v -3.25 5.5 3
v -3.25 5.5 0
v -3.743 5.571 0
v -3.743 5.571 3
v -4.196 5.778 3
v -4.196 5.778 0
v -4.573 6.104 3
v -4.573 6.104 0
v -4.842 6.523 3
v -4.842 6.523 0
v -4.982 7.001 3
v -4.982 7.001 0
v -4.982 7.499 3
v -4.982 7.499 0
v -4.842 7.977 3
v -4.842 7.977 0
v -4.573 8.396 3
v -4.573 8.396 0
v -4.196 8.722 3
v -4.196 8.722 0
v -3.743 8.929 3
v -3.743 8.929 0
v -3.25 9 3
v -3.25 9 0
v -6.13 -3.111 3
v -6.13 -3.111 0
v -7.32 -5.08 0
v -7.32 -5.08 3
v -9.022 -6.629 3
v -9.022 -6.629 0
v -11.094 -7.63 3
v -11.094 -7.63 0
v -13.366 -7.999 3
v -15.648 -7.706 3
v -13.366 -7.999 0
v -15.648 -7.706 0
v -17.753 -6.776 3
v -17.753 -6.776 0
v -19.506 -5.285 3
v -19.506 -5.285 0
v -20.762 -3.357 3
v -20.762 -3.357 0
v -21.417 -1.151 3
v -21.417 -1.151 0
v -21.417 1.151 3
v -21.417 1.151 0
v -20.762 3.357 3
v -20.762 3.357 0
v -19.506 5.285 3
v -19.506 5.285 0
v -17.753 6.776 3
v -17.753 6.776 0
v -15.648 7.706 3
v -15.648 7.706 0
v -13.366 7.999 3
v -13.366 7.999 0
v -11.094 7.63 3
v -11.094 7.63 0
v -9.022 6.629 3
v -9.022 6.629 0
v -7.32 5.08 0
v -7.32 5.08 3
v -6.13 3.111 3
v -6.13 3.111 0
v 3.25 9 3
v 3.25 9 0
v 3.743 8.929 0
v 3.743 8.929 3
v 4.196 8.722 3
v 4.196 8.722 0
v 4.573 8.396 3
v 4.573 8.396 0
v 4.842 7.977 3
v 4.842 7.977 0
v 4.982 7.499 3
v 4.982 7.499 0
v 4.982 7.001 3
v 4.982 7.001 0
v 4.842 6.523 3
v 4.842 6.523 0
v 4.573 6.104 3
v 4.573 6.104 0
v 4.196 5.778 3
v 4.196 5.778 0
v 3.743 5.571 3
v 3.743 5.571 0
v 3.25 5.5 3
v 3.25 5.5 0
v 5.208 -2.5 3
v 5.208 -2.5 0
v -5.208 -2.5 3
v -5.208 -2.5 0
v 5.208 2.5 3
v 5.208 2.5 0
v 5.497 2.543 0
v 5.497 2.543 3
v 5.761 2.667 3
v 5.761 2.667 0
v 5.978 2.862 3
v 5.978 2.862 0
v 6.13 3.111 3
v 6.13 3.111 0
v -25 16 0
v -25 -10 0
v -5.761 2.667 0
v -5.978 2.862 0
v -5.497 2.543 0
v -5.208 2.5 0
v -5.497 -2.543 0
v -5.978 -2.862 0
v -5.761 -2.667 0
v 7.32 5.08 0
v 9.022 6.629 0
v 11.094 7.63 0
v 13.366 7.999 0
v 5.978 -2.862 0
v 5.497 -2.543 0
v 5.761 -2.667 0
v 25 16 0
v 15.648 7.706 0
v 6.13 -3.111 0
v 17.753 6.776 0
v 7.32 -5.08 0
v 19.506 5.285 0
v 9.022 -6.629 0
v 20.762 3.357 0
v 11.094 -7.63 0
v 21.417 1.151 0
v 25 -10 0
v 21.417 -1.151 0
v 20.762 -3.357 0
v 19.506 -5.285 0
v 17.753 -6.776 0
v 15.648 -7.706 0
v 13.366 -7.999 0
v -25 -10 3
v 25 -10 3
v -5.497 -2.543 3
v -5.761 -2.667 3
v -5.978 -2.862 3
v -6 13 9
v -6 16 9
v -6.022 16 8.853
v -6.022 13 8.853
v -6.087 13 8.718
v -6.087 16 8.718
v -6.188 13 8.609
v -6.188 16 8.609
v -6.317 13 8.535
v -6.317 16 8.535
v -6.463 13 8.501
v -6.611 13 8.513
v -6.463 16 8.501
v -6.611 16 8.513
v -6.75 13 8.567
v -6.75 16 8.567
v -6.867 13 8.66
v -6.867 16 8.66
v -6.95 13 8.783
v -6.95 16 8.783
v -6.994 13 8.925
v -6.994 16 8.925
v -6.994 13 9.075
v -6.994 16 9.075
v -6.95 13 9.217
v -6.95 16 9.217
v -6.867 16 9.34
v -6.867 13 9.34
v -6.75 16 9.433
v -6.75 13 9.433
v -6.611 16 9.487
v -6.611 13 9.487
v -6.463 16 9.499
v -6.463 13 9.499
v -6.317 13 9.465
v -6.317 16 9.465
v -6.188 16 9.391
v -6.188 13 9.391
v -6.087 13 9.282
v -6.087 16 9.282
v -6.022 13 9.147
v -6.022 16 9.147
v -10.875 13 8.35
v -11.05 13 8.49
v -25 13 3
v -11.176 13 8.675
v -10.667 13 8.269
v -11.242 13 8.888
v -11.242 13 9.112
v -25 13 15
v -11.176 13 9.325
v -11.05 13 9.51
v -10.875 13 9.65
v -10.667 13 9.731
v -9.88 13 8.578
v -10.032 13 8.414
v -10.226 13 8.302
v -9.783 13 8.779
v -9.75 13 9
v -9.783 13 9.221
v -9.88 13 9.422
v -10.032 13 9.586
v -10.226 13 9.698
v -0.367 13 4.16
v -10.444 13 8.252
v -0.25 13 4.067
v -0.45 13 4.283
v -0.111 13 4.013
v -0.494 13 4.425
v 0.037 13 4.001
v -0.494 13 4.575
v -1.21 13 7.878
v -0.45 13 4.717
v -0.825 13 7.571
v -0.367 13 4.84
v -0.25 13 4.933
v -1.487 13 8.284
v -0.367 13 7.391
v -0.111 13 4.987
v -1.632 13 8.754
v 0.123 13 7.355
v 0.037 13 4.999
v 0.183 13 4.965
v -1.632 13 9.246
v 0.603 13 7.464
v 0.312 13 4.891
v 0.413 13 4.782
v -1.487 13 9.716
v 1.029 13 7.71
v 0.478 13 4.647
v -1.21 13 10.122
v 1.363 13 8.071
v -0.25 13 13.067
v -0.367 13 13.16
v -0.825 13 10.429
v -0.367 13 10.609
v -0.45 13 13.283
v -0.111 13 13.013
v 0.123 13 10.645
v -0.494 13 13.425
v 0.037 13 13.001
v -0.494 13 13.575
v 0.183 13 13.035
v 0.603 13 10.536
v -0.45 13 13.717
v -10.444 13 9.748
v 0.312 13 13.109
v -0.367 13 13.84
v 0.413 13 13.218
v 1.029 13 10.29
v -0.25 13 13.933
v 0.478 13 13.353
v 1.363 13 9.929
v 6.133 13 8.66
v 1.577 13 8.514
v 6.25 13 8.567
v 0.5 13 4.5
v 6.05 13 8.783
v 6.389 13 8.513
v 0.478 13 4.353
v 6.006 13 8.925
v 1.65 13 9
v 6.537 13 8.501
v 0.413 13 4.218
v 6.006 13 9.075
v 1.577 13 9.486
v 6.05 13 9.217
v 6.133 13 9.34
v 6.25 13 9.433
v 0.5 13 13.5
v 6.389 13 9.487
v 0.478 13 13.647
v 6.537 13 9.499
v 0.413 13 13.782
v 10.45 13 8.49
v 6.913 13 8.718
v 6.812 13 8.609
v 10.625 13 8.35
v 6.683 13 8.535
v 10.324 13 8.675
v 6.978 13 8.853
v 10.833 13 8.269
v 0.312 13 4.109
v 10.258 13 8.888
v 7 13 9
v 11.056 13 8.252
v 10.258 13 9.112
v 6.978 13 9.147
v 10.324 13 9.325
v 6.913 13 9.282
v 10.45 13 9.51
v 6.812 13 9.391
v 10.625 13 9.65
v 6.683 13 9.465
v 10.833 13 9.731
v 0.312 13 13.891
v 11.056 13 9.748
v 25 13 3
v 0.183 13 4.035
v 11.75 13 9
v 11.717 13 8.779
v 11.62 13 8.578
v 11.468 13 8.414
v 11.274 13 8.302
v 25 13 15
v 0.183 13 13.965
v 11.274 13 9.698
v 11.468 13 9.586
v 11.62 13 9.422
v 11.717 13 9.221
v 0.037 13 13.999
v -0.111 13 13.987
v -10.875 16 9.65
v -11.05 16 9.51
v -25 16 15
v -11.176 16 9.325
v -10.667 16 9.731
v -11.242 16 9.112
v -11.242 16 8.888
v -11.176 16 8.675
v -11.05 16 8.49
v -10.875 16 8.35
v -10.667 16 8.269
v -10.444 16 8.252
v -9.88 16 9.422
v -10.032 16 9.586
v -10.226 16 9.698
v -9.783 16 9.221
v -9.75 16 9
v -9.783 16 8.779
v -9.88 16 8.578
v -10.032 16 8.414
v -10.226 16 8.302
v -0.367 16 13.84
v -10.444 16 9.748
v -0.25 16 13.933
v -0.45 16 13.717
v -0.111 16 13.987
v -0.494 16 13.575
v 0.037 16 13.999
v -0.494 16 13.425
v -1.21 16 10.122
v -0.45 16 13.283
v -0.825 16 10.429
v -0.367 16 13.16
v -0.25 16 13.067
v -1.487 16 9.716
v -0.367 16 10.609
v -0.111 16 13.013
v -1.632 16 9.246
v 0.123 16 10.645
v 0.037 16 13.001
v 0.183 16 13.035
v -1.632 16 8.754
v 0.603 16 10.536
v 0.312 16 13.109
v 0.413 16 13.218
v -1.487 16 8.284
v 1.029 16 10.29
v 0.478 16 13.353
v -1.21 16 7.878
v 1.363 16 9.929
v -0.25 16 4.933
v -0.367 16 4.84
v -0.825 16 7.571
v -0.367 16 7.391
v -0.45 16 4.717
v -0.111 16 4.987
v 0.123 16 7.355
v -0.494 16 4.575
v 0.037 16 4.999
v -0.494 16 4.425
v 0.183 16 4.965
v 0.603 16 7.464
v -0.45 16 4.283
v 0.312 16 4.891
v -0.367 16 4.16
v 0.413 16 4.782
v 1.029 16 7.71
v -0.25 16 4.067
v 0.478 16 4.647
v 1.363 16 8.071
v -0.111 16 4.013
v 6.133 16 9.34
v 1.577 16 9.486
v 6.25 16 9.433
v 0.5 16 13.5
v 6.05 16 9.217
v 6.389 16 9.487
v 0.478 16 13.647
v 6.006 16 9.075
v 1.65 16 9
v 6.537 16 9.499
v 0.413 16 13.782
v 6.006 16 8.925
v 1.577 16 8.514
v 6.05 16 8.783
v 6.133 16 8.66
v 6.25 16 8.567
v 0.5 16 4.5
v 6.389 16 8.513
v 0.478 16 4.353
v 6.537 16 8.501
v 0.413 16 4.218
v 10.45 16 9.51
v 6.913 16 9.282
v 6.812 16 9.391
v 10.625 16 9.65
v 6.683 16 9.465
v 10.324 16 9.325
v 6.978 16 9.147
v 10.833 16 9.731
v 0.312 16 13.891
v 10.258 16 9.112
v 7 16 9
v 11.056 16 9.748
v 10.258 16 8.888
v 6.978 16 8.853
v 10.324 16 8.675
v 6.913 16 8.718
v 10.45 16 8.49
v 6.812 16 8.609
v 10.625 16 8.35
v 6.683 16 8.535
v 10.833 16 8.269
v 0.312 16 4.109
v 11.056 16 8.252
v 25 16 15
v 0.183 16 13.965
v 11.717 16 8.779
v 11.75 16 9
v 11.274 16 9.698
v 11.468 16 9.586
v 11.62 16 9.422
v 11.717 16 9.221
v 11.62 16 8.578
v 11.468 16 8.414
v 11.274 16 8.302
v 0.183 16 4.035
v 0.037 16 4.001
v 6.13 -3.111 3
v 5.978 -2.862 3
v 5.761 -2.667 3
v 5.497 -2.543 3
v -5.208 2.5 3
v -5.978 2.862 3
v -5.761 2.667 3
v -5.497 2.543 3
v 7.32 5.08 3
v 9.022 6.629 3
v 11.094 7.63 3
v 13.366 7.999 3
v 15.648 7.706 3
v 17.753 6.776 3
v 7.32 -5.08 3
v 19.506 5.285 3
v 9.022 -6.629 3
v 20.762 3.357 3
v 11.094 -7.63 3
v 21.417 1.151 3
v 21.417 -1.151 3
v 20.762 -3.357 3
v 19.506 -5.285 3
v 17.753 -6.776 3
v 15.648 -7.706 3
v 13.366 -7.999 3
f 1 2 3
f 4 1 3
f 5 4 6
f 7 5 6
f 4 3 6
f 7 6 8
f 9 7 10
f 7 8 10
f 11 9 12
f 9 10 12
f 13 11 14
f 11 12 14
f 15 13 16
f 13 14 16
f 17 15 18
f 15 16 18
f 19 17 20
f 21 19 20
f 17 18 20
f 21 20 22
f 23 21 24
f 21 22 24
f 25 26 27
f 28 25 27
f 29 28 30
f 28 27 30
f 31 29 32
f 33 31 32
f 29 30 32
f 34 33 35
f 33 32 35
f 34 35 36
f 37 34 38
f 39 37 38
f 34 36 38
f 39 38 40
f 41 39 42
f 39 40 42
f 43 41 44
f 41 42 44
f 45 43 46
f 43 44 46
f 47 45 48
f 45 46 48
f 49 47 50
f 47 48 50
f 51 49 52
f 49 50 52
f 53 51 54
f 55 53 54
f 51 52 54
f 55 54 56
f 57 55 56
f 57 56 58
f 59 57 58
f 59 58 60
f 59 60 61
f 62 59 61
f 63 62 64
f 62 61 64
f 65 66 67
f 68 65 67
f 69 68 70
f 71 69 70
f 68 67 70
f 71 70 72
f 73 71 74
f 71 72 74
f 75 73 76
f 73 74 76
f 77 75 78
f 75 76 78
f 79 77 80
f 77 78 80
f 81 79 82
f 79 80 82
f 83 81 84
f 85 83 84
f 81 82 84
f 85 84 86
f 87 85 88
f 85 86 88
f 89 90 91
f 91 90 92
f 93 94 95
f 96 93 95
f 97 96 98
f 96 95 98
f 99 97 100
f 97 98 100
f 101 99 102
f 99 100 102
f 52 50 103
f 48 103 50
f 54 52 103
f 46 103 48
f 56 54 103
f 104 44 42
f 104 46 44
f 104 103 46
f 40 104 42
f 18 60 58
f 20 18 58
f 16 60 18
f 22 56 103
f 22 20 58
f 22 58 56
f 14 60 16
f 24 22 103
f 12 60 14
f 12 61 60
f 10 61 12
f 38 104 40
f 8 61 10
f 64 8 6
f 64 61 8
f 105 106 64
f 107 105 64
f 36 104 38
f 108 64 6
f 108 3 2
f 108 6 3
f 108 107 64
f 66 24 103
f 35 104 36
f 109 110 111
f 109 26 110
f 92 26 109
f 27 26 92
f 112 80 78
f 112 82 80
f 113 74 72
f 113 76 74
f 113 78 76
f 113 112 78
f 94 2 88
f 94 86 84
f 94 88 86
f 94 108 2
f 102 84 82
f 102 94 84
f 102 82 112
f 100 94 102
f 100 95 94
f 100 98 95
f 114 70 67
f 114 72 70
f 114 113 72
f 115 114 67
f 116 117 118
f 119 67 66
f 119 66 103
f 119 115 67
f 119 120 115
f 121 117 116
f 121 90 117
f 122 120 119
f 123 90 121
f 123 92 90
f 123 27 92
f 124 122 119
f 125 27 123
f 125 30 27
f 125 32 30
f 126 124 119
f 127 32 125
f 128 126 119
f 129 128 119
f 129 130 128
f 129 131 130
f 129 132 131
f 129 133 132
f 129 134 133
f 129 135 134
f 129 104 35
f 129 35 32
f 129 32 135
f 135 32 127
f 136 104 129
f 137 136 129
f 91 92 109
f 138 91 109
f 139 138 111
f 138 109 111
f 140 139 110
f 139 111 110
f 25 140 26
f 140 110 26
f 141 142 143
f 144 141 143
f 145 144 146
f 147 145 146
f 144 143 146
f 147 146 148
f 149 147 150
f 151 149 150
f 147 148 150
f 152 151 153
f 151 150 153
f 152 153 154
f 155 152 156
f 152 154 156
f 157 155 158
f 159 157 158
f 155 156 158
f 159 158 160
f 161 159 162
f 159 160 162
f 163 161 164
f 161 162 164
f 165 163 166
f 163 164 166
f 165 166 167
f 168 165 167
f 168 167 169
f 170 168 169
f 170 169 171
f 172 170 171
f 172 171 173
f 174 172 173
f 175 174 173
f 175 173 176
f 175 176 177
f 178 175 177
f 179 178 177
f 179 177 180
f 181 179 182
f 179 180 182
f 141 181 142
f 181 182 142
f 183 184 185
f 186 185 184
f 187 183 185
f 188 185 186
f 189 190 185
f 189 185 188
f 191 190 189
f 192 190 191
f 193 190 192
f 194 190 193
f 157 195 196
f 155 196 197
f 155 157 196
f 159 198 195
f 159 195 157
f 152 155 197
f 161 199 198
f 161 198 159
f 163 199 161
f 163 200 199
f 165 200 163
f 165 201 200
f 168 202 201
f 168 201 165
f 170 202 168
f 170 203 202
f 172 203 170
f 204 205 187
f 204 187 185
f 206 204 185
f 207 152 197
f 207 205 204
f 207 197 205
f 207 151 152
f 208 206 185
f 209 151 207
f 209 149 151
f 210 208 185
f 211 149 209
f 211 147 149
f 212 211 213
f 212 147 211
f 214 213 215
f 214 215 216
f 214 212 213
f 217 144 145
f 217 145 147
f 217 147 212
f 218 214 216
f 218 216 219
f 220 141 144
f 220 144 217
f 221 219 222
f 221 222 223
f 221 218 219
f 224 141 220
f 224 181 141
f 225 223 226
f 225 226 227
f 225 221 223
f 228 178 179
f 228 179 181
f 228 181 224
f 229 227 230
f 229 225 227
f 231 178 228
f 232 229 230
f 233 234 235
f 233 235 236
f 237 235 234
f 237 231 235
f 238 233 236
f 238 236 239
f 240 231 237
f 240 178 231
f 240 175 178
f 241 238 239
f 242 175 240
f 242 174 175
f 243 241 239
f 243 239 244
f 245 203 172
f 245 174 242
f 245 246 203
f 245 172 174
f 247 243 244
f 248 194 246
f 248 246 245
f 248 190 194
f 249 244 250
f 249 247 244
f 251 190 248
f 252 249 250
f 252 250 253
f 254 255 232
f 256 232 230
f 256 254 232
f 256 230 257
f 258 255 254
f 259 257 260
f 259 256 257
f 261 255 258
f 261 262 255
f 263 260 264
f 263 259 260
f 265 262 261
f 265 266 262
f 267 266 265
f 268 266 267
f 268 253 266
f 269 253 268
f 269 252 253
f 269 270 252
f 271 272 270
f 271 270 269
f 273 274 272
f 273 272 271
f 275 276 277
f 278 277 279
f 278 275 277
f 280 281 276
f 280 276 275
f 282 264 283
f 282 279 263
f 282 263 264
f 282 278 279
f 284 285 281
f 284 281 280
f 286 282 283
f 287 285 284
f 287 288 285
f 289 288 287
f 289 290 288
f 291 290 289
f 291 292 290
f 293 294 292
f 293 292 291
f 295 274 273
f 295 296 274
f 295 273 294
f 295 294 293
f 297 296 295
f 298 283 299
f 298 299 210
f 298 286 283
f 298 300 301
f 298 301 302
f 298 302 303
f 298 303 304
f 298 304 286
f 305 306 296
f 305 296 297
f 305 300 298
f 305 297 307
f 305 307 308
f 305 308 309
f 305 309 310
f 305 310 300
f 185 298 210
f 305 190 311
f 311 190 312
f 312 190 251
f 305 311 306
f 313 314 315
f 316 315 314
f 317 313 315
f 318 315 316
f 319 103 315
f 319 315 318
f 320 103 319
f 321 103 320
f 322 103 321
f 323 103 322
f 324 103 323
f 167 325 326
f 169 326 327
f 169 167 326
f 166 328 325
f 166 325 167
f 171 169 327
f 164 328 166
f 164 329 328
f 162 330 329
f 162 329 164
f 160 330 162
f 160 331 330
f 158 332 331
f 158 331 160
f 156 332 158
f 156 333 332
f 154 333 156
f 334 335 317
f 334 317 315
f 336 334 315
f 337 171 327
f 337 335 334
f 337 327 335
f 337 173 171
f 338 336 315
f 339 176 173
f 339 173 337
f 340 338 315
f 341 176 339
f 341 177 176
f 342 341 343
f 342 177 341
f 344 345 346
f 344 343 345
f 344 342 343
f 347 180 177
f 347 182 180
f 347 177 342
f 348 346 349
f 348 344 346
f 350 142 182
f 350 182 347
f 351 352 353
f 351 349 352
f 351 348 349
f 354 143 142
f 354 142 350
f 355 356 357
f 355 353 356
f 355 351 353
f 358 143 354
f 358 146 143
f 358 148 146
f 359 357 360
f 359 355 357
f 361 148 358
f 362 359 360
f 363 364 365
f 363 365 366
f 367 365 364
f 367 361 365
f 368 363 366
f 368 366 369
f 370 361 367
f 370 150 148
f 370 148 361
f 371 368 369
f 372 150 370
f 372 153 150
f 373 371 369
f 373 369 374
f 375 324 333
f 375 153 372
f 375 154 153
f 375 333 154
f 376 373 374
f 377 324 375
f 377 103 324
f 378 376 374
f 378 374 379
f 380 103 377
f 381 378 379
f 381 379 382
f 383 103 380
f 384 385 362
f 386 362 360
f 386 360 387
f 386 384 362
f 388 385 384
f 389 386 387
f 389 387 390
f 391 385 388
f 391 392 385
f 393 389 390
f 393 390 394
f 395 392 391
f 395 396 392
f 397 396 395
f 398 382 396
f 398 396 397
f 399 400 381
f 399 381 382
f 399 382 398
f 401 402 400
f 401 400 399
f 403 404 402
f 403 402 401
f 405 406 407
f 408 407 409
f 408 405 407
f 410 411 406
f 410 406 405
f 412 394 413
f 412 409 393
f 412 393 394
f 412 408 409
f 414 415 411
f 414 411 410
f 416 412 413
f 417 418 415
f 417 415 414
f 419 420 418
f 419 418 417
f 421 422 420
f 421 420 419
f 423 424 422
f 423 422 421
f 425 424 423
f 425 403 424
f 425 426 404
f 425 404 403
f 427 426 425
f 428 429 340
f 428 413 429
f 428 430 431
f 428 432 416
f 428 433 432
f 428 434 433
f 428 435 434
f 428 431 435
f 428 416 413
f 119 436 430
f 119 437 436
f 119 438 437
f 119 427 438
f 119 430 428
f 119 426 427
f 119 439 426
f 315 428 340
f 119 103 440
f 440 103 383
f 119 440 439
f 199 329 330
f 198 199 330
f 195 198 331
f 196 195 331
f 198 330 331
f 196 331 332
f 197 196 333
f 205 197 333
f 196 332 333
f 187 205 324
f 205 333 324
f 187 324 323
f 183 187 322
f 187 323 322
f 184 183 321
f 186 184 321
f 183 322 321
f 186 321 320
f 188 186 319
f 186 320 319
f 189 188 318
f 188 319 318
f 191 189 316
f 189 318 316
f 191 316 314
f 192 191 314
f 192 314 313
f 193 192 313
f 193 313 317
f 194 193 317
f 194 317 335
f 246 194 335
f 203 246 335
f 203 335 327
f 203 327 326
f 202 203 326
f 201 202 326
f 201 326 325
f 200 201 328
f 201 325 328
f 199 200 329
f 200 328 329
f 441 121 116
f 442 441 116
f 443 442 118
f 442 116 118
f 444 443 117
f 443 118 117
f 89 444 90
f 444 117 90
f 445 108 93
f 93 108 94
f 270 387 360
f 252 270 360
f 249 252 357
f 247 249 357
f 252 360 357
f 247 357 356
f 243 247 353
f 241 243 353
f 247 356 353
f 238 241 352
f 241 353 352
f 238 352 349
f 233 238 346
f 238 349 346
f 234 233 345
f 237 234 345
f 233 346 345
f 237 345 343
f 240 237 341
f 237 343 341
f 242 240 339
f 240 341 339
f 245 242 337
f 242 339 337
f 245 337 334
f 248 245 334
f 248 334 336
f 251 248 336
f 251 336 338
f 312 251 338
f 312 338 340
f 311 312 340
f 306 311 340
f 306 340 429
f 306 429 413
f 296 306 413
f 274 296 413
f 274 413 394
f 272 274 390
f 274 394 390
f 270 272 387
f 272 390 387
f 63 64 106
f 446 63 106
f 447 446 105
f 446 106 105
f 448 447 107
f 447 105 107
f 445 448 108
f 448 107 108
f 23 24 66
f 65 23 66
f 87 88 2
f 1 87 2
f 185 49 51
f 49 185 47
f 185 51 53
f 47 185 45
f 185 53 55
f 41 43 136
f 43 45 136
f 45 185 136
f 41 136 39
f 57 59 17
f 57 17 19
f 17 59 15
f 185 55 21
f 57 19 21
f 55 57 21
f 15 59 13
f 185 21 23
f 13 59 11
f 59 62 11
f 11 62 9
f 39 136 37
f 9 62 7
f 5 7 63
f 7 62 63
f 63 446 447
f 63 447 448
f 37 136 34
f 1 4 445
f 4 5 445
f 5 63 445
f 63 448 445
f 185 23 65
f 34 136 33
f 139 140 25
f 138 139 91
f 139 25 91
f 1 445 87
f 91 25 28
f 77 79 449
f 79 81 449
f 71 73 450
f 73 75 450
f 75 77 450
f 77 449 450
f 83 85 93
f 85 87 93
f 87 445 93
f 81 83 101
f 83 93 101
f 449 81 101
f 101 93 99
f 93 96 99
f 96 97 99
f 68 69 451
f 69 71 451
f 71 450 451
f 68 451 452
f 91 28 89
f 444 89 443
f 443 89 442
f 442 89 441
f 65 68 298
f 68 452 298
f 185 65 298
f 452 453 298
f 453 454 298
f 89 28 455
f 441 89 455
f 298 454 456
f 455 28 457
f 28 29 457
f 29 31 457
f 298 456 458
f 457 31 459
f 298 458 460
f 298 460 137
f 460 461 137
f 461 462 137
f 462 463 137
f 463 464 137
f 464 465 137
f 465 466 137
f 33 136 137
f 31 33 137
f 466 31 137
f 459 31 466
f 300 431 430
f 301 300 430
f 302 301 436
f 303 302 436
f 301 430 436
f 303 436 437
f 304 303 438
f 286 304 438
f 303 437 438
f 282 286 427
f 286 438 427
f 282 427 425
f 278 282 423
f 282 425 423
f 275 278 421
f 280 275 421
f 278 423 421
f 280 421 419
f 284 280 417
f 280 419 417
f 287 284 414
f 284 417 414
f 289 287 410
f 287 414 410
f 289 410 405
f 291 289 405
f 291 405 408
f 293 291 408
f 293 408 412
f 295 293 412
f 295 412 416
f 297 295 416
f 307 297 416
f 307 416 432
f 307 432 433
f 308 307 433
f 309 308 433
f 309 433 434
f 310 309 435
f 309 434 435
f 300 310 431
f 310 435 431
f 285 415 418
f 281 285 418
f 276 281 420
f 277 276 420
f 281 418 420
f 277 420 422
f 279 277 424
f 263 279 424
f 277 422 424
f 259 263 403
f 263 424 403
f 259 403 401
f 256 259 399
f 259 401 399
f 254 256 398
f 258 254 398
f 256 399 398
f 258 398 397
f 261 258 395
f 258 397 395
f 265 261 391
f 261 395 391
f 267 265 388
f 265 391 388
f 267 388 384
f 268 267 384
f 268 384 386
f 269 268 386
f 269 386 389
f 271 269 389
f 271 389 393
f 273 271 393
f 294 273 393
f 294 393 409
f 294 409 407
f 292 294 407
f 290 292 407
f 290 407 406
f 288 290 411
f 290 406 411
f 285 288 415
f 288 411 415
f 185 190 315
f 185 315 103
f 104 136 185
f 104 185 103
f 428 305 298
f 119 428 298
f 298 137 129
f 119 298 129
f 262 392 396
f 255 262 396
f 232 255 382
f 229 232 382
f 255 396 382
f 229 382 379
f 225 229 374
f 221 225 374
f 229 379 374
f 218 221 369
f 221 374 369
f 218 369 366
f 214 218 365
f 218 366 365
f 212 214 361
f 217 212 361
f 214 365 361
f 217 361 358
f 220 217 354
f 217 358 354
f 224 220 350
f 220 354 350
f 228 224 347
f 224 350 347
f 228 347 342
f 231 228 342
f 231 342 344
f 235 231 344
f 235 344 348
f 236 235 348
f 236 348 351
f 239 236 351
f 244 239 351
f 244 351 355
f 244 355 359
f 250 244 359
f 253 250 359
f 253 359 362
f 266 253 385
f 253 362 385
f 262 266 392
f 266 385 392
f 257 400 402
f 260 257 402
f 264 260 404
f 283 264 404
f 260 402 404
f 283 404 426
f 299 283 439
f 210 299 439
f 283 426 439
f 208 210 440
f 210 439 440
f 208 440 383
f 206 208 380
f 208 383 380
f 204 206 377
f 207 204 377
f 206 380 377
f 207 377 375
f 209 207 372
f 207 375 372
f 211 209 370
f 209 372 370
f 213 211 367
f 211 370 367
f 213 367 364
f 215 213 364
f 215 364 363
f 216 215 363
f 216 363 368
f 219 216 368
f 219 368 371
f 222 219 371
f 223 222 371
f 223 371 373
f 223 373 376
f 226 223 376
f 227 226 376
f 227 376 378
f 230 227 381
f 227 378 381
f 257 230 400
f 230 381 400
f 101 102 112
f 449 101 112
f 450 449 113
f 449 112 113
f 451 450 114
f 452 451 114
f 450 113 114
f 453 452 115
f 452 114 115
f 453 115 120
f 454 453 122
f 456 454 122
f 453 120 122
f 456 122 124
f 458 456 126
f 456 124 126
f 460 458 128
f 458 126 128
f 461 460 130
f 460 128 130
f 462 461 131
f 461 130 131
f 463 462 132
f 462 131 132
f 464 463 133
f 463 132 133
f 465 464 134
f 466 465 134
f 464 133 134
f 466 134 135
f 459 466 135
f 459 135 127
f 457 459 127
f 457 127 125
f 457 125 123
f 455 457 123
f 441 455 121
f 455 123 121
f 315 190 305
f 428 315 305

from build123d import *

# Parameters (mm, degrees)
SKETCH_1_W          = 50
SKETCH_1_H          = 20
EXTRUDE_1_DEPTH     = 3
SKETCH_2_W          = 50
SKETCH_2_H          = 15
EXTRUDE_2_DEPTH     = 6
SKETCH_5_W          = 50
SKETCH_5_H          = 12
CUT_EXTRUDE_2_DEPTH = 3
SKETCH_4_R          = 1.65
SKETCH_4_R_2        = 0.5
SKETCH_4_R_3        = 0.75
CUT_EXTRUDE_1_DEPTH = 3


with BuildPart() as part:
    # 草图1 → 凸台-拉伸1 (new body)
    with BuildSketch(Plane.XY):
        Rectangle(SKETCH_1_W, SKETCH_1_H)
        with BuildLine():
            Line((-5.208438024, 2.5), (5.208438024, 2.5))
            ThreePointArc((5.208438024, 2.5), (5.761208823, 2.666666667), (6.129722688, 3.111111111))
            ThreePointArc((6.129722688, 3.111111111), (21.5, 0), (6.129722688, -3.111111111))
            ThreePointArc((6.129722688, -3.111111111), (5.761208823, -2.666666667), (5.208438024, -2.5))
            Line((5.208438024, -2.5), (-5.208438024, -2.5))
            ThreePointArc((-5.208438024, -2.5), (-5.761208823, -2.666666667), (-6.129722688, -3.111111111))
            ThreePointArc((-6.129722688, -3.111111111), (-21.5, 0), (-6.129722688, 3.111111111))
            ThreePointArc((-6.129722688, 3.111111111), (-5.761208823, 2.666666667), (-5.208438024, 2.5))
        make_face(mode=Mode.SUBTRACT)
        with BuildLine():
            Line((3.25, 5.5), (-3.25, 5.5))
            ThreePointArc((-3.25, 5.5), (-5, 7.25), (-3.25, 9))
            Line((-3.25, 9), (3.25, 9))
            ThreePointArc((3.25, 9), (5, 7.25), (3.25, 5.5))
        make_face(mode=Mode.SUBTRACT)
    extrude(amount=EXTRUDE_1_DEPTH)

    # 草图2 → 凸台-拉伸2 (add)
    with BuildSketch(Plane(origin=(0, 10, 0), x_dir=(1, 0, 0), z_dir=(0, 1, 0))):
        with Locations((0, -7.5)):
            Rectangle(SKETCH_2_W, SKETCH_2_H)
    extrude(amount=EXTRUDE_2_DEPTH)

    # 草图5 → 切除-拉伸2 (cut)
    with BuildSketch(Plane.XZ.offset(-10)):
        with Locations((0, 9)):
            Rectangle(SKETCH_5_W, SKETCH_5_H)
    extrude(amount=-CUT_EXTRUDE_2_DEPTH, mode=Mode.SUBTRACT)

    # 草图4 → 切除-拉伸1 (cut)
    with BuildSketch(Plane(origin=(0, 16, 0), x_dir=(1, 0, 0), z_dir=(0, 1, 0))):
        with Locations((0, -9)):
            Circle(SKETCH_4_R)
        with Locations((6.5, -9)):
            Circle(SKETCH_4_R_2)
        with Locations((-6.5, -9)):
            Circle(SKETCH_4_R_2)
        with Locations((11, -9)):
            Circle(SKETCH_4_R_3)
        with Locations((-10.5, -9)):
            Circle(SKETCH_4_R_3)
        with Locations((0, -4.5)):
            Circle(SKETCH_4_R_2)
        with Locations((0, -13.5)):
            Circle(SKETCH_4_R_2)
    extrude(amount=-CUT_EXTRUDE_1_DEPTH, mode=Mode.SUBTRACT)


solid = part.part
